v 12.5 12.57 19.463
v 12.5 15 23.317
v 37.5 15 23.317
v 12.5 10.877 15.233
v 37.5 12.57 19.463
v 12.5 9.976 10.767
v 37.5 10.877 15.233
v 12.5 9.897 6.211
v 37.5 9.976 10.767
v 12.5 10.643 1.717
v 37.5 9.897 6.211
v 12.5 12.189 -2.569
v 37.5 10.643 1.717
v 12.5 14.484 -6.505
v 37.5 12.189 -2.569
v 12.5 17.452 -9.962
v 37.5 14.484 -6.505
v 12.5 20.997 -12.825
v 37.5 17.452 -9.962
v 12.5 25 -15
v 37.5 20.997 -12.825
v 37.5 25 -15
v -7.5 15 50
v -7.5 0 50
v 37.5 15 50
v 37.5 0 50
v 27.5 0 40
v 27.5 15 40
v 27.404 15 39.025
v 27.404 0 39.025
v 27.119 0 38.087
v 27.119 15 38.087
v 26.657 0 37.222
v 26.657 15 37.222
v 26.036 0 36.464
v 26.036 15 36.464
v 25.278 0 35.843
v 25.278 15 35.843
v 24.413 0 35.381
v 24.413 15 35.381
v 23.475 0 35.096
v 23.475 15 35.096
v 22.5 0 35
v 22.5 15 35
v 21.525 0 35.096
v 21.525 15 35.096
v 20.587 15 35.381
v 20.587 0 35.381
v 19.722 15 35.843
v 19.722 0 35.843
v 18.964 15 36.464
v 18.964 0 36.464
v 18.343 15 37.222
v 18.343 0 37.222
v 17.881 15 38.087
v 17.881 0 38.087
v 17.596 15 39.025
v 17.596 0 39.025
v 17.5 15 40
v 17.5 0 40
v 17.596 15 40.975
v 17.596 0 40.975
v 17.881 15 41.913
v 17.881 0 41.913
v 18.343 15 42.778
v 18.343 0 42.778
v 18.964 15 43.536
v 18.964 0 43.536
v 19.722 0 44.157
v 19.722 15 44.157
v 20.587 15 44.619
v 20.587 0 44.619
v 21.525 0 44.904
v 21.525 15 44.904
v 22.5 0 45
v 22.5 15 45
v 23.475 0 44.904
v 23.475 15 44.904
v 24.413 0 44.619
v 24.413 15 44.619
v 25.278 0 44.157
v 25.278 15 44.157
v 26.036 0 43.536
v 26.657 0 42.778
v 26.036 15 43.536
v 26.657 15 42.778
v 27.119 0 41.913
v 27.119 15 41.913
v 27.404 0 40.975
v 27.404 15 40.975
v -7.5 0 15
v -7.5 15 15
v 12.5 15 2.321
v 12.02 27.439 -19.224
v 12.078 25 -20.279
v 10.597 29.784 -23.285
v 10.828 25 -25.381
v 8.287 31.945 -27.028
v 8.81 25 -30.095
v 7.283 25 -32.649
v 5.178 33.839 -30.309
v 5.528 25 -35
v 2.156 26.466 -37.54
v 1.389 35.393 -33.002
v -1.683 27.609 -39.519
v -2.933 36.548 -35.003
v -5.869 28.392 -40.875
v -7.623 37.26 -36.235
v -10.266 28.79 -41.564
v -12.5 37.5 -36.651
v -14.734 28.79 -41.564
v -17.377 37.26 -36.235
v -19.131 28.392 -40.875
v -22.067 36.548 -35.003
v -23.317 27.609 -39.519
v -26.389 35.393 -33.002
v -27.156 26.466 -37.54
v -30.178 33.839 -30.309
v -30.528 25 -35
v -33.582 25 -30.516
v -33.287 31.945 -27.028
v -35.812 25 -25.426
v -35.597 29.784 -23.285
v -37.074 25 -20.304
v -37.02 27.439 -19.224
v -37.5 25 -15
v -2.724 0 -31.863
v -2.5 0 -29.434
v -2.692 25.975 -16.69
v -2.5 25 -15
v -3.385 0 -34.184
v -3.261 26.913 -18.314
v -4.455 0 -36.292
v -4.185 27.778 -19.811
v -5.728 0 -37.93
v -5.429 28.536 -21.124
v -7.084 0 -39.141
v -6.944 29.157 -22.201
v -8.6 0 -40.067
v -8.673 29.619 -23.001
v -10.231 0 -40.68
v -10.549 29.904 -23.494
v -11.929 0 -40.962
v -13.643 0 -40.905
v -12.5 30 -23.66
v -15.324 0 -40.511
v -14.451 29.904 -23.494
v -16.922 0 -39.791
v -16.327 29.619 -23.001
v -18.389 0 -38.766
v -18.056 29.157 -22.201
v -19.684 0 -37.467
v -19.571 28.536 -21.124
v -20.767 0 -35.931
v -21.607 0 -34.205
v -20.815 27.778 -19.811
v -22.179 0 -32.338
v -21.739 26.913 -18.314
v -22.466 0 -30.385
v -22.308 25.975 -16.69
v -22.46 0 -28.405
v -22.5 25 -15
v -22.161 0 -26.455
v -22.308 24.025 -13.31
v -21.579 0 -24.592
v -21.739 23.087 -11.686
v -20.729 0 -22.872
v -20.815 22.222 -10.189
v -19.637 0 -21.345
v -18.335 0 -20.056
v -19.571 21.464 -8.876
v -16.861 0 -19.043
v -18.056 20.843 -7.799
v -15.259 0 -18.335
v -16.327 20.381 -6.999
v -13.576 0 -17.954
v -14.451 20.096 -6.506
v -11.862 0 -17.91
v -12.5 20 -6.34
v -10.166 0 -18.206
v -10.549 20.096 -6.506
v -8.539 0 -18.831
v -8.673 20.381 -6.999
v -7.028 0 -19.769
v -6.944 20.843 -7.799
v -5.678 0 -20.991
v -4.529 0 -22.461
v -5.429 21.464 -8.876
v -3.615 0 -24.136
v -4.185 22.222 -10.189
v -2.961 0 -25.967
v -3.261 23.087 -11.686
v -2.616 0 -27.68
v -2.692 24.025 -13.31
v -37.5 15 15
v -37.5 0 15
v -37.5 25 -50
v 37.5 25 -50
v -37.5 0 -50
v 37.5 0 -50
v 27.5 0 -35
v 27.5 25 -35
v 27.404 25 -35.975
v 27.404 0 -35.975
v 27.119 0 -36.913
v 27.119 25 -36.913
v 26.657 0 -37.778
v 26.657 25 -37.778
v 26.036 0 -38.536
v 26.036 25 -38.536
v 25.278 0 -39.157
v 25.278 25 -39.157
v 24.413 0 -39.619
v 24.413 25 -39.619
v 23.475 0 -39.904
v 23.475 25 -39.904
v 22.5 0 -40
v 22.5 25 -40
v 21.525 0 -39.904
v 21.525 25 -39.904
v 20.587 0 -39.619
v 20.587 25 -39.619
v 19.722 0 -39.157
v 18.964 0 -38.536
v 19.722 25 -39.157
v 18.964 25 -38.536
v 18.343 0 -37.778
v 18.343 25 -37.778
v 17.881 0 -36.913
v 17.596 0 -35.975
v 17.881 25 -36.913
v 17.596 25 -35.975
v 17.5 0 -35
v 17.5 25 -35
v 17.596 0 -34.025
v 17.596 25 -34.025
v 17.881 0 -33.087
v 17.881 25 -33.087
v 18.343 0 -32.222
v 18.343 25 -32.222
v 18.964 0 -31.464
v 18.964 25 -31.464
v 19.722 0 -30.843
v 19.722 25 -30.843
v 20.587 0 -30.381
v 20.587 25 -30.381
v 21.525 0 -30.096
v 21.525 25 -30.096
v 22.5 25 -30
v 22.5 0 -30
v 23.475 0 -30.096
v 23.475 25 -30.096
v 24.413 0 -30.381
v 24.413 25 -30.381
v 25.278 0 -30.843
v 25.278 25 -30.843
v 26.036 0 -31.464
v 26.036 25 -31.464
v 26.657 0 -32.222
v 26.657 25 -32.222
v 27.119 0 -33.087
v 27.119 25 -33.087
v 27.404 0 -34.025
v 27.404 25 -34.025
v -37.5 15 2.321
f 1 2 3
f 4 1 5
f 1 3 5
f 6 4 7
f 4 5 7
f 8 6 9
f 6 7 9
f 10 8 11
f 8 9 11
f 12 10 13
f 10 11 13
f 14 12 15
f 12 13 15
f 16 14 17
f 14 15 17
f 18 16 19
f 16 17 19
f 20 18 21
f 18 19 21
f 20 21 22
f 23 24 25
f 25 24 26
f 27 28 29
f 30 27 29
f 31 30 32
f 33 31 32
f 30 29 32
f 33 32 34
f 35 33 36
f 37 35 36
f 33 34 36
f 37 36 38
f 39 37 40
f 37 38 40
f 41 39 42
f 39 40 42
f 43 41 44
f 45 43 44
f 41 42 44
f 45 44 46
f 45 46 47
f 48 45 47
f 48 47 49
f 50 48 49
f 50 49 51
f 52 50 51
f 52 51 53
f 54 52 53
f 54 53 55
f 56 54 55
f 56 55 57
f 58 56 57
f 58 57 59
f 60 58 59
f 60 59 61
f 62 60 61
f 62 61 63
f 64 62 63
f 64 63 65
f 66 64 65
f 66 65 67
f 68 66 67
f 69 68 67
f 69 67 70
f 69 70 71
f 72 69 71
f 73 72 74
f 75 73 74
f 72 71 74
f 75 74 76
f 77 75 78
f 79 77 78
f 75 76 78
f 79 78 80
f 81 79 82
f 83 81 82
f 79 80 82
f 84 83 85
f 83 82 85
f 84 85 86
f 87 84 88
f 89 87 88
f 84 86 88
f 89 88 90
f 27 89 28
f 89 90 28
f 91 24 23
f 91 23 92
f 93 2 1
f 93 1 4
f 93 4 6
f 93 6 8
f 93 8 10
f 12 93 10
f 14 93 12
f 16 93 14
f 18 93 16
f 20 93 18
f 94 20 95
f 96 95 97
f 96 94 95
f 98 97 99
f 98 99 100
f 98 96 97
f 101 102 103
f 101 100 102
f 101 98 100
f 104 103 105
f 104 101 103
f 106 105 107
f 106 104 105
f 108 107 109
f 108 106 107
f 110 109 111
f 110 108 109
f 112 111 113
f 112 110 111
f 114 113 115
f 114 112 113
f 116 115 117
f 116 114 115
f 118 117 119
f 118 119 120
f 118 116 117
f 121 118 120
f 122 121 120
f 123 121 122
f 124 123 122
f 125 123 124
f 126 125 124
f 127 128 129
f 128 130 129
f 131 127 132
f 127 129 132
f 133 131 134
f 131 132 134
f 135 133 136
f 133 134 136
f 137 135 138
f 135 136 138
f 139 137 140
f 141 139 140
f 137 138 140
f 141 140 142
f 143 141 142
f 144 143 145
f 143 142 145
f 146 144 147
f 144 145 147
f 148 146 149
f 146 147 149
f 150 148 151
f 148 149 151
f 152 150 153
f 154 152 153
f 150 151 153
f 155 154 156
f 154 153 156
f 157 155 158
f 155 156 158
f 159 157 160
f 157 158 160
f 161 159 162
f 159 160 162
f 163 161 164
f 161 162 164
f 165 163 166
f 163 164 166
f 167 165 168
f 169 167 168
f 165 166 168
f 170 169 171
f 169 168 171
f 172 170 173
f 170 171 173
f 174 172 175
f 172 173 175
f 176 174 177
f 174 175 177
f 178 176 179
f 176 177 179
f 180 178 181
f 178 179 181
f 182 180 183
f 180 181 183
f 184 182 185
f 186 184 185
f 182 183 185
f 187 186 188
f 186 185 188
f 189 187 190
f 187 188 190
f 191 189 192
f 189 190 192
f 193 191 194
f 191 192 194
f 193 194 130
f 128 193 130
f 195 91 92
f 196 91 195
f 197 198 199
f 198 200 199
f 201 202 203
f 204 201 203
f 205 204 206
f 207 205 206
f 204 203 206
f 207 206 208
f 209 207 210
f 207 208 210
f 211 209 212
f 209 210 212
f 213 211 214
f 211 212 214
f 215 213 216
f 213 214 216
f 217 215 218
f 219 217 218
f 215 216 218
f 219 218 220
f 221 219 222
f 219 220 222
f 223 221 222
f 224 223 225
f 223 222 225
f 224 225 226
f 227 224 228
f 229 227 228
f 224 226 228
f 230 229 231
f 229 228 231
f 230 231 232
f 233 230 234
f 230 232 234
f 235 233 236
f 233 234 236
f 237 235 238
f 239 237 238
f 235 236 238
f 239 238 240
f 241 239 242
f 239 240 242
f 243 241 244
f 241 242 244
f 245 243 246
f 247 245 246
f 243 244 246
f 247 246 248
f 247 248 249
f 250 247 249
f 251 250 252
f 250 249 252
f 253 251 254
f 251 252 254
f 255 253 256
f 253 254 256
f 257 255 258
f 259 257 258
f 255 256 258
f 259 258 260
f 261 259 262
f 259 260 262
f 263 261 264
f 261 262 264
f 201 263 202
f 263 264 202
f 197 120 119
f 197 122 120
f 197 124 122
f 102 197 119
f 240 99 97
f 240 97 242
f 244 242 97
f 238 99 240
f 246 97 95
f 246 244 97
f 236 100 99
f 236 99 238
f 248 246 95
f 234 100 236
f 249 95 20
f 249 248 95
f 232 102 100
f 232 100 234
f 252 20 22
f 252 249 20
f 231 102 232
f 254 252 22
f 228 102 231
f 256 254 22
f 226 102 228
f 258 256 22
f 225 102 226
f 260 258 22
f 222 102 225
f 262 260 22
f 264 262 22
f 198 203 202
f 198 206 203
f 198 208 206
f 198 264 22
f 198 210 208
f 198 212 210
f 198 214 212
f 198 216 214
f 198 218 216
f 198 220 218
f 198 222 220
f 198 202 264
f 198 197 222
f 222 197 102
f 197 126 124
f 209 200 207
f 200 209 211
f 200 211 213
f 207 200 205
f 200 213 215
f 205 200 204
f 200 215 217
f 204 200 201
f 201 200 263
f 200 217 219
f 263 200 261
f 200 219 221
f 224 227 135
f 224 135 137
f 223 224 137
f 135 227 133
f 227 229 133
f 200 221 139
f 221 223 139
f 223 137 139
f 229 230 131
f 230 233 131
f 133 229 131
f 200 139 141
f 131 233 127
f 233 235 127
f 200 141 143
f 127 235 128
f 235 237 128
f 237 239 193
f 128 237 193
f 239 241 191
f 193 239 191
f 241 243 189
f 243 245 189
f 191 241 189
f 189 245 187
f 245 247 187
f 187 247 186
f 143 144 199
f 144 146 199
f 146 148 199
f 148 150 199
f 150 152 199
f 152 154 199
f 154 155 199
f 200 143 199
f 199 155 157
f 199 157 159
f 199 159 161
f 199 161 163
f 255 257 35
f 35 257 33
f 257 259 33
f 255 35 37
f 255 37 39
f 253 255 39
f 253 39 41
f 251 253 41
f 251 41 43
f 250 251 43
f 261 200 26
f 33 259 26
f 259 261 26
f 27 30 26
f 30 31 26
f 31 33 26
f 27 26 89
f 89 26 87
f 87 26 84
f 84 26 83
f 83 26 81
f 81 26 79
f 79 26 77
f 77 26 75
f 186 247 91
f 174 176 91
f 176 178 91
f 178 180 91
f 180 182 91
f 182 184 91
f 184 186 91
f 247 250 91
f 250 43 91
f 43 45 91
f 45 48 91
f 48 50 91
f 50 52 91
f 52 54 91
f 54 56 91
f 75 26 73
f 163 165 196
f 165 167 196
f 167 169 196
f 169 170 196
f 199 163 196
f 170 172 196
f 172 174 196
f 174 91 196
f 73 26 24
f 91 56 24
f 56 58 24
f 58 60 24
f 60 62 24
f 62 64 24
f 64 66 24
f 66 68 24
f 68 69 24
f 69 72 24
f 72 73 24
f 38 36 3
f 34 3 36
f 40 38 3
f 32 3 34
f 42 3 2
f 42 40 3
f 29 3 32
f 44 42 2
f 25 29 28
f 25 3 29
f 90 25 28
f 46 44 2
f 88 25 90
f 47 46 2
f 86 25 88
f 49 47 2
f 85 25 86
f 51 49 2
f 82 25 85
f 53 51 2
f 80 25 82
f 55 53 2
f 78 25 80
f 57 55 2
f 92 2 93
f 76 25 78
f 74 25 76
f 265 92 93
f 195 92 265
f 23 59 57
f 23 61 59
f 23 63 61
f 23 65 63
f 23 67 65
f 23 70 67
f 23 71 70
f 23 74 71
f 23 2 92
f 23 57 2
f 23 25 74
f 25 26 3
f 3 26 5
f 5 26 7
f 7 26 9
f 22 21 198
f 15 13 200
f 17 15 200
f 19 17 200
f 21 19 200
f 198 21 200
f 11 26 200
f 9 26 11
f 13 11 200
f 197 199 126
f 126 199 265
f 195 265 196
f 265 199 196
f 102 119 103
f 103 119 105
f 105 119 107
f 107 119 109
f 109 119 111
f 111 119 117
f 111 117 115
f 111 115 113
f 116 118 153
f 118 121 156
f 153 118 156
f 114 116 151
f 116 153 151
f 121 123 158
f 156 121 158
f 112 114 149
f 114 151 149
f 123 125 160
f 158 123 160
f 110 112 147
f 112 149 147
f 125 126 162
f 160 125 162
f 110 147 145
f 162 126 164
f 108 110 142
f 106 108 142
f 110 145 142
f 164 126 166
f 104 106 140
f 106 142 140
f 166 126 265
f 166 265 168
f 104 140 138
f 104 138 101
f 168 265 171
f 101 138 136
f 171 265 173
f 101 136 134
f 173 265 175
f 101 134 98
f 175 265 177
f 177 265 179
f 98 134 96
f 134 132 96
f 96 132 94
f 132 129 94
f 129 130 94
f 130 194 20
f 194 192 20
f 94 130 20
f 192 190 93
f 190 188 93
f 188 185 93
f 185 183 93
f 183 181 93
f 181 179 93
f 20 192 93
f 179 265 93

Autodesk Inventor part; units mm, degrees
ref_plane "YZ Plane" through (0, 0, 0) normal (1, 0, 0) x (0, 1, 0)
ref_plane "XZ Plane" through (0, 0, 0) normal (0, 1, 0) x (-1, 0, 0)
sketch "Boceto1" plane through (0, 0, 0) normal (0, 1, 0) x (-1, 0, 0)
  line L0 (-37.5, -50) -> (37.5, -50)
  line L1 (37.5, -50) -> (37.5, 50)
  line L2 (37.5, 50) -> (-37.5, 50)
  line L3 (-37.5, 50) -> (-37.5, -50)
  line L4 (-37.5, -50) -> (37.5, 50) construction
  line L5 (37.5, -50) -> (-37.5, 50) construction
  line L6 (37.5, 50) -> (7.5, 50)
  line L7 (7.5, 50) -> (7.5, 15)
  line L8 (7.5, 15) -> (37.5, 15)
  line L9 (37.5, 15) -> (37.5, 50)
  point P0 (0, 0)
  dimension "d0" = 100
  dimension "d1" = 75
  dimension "d2" = 30
  dimension "d3" = 35
extrude "Extrusión1" add sketch "Boceto1" along normal blind 15 contours L3 L2 L7 L8 L1 L0
sketch "Boceto2" plane through (0, 15, 0) normal (0, 1, 0) x (1, 0, 0)
  line L0 (-37.5, 50) -> (-37.5, -15) projected
  line L1 (-37.5, 50) -> (37.5, 50)
  line L2 (37.5, 50) -> (37.5, 15)
  line L3 (37.5, 15) -> (-37.5, 15)
  line L4 (-37.5, 15) -> (-37.5, 50)
  point P0 (0, 0)
  dimension "d6" = 35
  dimension "d7" = 75
extrude "Extrusión2" add sketch "Boceto2" along normal blind 10
ref_plane "Plano de trabajo1" through (-37.5, 25, -15) normal (0, -0.866, -0.5) x (1, 0, 0)
sketch "Boceto3" plane through (-37.5, 25, -15) normal (0, -0.866, -0.5) x (1, 0, 0)
  line L0 (75, 5) -> (75, 0) projected
  line L1 (75, 0) -> (50, 0)
  line L2 (0, 0) -> (75, 0) projected
  line L3 (0, 30.9808) -> (30, 30.9808) projected
  line L4 (0, 5) -> (0, 0) projected
  line L5 (0, 30.9808) -> (0, 0)
  arc A0 (0, 0) -> (50, 0) centre (25, 0) ccw
  line L6 (50, 0) -> (50, 30.9808)
  line L7 (50, 30.9808) -> (0, 30.9808)
  circle A1 centre (25, 0) radius 10
  point P0 (37.5, 25.4904)
  point P1 (0, 5)
  dimension "d11" = 25
  dimension "d12" = 20
extrude "Extrusión3" add sketch "Boceto3" along normal blind 10 contours A1 L2 L4 L5 L3 L7 L6 | L2 A0 A1
sketch "Boceto4" plane through (-37.5, 25, -15) normal (0, 0.866, 0.5) x (1, 0, 0)
  line L0 (15, 0) -> (35, 0) projected
  circle A0 centre (25, 0) radius 10
  point P0 (37.5, -25.4904)
  dimension "d15" = 20
extrude "Extrusión4" cut sketch "Boceto4" against normal blind 40
sketch "Boceto5" plane through (37.5, 0, 50) normal (1, 0, 0) x (0, 0, -1)
  line L0 (35, 15) -> (0, 15) projected
  line L1 (0, 15) -> (0, 10)
  line L2 (0, 0) -> (0, 15) projected
  line L3 (0, 10) -> (69.9738, 10)
  line L4 (100, 0) -> (100, 25) projected
  line L5 (65, 25) -> (47.6795, 15) projected
  line L6 (65, 15) -> (65, 25) projected
  arc A0 (62.0755, 49.9347) -> (65, 25) centre (41.9437, 34.9347) ccw
  circle A1 centre (41.9437, 34.9347) radius 25.1056
  line L7 (0, 15) -> (65, 15) projected
  circle A2 centre (41.9437, 34.9347) radius 30.4793
  line L8 (65, 25) -> (70.7584, 25)
  line L9 (65, 25) -> (100, 25) projected
  point P0 (50, 0)
  point P1 (57.2047, 15)
  point P2 (62.0755, 49.9347)
  point P3 (39.0192, 10)
  point P4 (44.8682, 10)
  dimension "d18" = 5
extrude "Extrusión5" add sketch "Boceto5" against normal blind 25 contours L7 A0 L3 L0 | L0 A0 A1 L5 L7 | L5 A0 L7 | L6 L7 A0
sketch "Boceto6" plane through (37.5, 0, 50) normal (1, 0, 0) x (0, 0, -1)
  arc A0 (65, 25) -> (26.6827, 15) centre (41.9437, 34.9347) ccw projected
  circle A1 centre (41.9437, 34.9347) radius 25.1056
  point P0 (50, 0)
  point P1 (26.6827, 15)
extrude "Extrusión6" cut sketch "Boceto6" against normal blind 25
sketch "Boceto7" plane through (-37.5, 25, -15) normal (0, -0.866, -0.5) x (1, 0, 0)
  point P0 (37.5, 25.4904)
sketch "Boceto8" plane through (0, 25, 0) normal (0, 1, 0) x (1, 0, 0)
  circle A0 centre (22.5, 35) radius 5
  line L0 (37.5, 50) -> (-37.5, 50) projected
  line L1 (37.5, 15) -> (37.5, 50) projected
  circle A1 centre (22.5, -40) radius 5
  line L2 (-7.5, -50) -> (37.5, -50) projected
  line L3 (37.5, -50) -> (37.5, -23.3173) projected
  point P0 (0, 0)
  dimension "d23" = 15
  dimension "d24" = 15
  dimension "d25" = 10
  dimension "d26" = 10
  dimension "d27" = 15
  dimension "d28" = 10
extrude "Extrusión7" cut sketch "Boceto8" against normal blind 25
properties part number "Pieza3-Tarea2"
